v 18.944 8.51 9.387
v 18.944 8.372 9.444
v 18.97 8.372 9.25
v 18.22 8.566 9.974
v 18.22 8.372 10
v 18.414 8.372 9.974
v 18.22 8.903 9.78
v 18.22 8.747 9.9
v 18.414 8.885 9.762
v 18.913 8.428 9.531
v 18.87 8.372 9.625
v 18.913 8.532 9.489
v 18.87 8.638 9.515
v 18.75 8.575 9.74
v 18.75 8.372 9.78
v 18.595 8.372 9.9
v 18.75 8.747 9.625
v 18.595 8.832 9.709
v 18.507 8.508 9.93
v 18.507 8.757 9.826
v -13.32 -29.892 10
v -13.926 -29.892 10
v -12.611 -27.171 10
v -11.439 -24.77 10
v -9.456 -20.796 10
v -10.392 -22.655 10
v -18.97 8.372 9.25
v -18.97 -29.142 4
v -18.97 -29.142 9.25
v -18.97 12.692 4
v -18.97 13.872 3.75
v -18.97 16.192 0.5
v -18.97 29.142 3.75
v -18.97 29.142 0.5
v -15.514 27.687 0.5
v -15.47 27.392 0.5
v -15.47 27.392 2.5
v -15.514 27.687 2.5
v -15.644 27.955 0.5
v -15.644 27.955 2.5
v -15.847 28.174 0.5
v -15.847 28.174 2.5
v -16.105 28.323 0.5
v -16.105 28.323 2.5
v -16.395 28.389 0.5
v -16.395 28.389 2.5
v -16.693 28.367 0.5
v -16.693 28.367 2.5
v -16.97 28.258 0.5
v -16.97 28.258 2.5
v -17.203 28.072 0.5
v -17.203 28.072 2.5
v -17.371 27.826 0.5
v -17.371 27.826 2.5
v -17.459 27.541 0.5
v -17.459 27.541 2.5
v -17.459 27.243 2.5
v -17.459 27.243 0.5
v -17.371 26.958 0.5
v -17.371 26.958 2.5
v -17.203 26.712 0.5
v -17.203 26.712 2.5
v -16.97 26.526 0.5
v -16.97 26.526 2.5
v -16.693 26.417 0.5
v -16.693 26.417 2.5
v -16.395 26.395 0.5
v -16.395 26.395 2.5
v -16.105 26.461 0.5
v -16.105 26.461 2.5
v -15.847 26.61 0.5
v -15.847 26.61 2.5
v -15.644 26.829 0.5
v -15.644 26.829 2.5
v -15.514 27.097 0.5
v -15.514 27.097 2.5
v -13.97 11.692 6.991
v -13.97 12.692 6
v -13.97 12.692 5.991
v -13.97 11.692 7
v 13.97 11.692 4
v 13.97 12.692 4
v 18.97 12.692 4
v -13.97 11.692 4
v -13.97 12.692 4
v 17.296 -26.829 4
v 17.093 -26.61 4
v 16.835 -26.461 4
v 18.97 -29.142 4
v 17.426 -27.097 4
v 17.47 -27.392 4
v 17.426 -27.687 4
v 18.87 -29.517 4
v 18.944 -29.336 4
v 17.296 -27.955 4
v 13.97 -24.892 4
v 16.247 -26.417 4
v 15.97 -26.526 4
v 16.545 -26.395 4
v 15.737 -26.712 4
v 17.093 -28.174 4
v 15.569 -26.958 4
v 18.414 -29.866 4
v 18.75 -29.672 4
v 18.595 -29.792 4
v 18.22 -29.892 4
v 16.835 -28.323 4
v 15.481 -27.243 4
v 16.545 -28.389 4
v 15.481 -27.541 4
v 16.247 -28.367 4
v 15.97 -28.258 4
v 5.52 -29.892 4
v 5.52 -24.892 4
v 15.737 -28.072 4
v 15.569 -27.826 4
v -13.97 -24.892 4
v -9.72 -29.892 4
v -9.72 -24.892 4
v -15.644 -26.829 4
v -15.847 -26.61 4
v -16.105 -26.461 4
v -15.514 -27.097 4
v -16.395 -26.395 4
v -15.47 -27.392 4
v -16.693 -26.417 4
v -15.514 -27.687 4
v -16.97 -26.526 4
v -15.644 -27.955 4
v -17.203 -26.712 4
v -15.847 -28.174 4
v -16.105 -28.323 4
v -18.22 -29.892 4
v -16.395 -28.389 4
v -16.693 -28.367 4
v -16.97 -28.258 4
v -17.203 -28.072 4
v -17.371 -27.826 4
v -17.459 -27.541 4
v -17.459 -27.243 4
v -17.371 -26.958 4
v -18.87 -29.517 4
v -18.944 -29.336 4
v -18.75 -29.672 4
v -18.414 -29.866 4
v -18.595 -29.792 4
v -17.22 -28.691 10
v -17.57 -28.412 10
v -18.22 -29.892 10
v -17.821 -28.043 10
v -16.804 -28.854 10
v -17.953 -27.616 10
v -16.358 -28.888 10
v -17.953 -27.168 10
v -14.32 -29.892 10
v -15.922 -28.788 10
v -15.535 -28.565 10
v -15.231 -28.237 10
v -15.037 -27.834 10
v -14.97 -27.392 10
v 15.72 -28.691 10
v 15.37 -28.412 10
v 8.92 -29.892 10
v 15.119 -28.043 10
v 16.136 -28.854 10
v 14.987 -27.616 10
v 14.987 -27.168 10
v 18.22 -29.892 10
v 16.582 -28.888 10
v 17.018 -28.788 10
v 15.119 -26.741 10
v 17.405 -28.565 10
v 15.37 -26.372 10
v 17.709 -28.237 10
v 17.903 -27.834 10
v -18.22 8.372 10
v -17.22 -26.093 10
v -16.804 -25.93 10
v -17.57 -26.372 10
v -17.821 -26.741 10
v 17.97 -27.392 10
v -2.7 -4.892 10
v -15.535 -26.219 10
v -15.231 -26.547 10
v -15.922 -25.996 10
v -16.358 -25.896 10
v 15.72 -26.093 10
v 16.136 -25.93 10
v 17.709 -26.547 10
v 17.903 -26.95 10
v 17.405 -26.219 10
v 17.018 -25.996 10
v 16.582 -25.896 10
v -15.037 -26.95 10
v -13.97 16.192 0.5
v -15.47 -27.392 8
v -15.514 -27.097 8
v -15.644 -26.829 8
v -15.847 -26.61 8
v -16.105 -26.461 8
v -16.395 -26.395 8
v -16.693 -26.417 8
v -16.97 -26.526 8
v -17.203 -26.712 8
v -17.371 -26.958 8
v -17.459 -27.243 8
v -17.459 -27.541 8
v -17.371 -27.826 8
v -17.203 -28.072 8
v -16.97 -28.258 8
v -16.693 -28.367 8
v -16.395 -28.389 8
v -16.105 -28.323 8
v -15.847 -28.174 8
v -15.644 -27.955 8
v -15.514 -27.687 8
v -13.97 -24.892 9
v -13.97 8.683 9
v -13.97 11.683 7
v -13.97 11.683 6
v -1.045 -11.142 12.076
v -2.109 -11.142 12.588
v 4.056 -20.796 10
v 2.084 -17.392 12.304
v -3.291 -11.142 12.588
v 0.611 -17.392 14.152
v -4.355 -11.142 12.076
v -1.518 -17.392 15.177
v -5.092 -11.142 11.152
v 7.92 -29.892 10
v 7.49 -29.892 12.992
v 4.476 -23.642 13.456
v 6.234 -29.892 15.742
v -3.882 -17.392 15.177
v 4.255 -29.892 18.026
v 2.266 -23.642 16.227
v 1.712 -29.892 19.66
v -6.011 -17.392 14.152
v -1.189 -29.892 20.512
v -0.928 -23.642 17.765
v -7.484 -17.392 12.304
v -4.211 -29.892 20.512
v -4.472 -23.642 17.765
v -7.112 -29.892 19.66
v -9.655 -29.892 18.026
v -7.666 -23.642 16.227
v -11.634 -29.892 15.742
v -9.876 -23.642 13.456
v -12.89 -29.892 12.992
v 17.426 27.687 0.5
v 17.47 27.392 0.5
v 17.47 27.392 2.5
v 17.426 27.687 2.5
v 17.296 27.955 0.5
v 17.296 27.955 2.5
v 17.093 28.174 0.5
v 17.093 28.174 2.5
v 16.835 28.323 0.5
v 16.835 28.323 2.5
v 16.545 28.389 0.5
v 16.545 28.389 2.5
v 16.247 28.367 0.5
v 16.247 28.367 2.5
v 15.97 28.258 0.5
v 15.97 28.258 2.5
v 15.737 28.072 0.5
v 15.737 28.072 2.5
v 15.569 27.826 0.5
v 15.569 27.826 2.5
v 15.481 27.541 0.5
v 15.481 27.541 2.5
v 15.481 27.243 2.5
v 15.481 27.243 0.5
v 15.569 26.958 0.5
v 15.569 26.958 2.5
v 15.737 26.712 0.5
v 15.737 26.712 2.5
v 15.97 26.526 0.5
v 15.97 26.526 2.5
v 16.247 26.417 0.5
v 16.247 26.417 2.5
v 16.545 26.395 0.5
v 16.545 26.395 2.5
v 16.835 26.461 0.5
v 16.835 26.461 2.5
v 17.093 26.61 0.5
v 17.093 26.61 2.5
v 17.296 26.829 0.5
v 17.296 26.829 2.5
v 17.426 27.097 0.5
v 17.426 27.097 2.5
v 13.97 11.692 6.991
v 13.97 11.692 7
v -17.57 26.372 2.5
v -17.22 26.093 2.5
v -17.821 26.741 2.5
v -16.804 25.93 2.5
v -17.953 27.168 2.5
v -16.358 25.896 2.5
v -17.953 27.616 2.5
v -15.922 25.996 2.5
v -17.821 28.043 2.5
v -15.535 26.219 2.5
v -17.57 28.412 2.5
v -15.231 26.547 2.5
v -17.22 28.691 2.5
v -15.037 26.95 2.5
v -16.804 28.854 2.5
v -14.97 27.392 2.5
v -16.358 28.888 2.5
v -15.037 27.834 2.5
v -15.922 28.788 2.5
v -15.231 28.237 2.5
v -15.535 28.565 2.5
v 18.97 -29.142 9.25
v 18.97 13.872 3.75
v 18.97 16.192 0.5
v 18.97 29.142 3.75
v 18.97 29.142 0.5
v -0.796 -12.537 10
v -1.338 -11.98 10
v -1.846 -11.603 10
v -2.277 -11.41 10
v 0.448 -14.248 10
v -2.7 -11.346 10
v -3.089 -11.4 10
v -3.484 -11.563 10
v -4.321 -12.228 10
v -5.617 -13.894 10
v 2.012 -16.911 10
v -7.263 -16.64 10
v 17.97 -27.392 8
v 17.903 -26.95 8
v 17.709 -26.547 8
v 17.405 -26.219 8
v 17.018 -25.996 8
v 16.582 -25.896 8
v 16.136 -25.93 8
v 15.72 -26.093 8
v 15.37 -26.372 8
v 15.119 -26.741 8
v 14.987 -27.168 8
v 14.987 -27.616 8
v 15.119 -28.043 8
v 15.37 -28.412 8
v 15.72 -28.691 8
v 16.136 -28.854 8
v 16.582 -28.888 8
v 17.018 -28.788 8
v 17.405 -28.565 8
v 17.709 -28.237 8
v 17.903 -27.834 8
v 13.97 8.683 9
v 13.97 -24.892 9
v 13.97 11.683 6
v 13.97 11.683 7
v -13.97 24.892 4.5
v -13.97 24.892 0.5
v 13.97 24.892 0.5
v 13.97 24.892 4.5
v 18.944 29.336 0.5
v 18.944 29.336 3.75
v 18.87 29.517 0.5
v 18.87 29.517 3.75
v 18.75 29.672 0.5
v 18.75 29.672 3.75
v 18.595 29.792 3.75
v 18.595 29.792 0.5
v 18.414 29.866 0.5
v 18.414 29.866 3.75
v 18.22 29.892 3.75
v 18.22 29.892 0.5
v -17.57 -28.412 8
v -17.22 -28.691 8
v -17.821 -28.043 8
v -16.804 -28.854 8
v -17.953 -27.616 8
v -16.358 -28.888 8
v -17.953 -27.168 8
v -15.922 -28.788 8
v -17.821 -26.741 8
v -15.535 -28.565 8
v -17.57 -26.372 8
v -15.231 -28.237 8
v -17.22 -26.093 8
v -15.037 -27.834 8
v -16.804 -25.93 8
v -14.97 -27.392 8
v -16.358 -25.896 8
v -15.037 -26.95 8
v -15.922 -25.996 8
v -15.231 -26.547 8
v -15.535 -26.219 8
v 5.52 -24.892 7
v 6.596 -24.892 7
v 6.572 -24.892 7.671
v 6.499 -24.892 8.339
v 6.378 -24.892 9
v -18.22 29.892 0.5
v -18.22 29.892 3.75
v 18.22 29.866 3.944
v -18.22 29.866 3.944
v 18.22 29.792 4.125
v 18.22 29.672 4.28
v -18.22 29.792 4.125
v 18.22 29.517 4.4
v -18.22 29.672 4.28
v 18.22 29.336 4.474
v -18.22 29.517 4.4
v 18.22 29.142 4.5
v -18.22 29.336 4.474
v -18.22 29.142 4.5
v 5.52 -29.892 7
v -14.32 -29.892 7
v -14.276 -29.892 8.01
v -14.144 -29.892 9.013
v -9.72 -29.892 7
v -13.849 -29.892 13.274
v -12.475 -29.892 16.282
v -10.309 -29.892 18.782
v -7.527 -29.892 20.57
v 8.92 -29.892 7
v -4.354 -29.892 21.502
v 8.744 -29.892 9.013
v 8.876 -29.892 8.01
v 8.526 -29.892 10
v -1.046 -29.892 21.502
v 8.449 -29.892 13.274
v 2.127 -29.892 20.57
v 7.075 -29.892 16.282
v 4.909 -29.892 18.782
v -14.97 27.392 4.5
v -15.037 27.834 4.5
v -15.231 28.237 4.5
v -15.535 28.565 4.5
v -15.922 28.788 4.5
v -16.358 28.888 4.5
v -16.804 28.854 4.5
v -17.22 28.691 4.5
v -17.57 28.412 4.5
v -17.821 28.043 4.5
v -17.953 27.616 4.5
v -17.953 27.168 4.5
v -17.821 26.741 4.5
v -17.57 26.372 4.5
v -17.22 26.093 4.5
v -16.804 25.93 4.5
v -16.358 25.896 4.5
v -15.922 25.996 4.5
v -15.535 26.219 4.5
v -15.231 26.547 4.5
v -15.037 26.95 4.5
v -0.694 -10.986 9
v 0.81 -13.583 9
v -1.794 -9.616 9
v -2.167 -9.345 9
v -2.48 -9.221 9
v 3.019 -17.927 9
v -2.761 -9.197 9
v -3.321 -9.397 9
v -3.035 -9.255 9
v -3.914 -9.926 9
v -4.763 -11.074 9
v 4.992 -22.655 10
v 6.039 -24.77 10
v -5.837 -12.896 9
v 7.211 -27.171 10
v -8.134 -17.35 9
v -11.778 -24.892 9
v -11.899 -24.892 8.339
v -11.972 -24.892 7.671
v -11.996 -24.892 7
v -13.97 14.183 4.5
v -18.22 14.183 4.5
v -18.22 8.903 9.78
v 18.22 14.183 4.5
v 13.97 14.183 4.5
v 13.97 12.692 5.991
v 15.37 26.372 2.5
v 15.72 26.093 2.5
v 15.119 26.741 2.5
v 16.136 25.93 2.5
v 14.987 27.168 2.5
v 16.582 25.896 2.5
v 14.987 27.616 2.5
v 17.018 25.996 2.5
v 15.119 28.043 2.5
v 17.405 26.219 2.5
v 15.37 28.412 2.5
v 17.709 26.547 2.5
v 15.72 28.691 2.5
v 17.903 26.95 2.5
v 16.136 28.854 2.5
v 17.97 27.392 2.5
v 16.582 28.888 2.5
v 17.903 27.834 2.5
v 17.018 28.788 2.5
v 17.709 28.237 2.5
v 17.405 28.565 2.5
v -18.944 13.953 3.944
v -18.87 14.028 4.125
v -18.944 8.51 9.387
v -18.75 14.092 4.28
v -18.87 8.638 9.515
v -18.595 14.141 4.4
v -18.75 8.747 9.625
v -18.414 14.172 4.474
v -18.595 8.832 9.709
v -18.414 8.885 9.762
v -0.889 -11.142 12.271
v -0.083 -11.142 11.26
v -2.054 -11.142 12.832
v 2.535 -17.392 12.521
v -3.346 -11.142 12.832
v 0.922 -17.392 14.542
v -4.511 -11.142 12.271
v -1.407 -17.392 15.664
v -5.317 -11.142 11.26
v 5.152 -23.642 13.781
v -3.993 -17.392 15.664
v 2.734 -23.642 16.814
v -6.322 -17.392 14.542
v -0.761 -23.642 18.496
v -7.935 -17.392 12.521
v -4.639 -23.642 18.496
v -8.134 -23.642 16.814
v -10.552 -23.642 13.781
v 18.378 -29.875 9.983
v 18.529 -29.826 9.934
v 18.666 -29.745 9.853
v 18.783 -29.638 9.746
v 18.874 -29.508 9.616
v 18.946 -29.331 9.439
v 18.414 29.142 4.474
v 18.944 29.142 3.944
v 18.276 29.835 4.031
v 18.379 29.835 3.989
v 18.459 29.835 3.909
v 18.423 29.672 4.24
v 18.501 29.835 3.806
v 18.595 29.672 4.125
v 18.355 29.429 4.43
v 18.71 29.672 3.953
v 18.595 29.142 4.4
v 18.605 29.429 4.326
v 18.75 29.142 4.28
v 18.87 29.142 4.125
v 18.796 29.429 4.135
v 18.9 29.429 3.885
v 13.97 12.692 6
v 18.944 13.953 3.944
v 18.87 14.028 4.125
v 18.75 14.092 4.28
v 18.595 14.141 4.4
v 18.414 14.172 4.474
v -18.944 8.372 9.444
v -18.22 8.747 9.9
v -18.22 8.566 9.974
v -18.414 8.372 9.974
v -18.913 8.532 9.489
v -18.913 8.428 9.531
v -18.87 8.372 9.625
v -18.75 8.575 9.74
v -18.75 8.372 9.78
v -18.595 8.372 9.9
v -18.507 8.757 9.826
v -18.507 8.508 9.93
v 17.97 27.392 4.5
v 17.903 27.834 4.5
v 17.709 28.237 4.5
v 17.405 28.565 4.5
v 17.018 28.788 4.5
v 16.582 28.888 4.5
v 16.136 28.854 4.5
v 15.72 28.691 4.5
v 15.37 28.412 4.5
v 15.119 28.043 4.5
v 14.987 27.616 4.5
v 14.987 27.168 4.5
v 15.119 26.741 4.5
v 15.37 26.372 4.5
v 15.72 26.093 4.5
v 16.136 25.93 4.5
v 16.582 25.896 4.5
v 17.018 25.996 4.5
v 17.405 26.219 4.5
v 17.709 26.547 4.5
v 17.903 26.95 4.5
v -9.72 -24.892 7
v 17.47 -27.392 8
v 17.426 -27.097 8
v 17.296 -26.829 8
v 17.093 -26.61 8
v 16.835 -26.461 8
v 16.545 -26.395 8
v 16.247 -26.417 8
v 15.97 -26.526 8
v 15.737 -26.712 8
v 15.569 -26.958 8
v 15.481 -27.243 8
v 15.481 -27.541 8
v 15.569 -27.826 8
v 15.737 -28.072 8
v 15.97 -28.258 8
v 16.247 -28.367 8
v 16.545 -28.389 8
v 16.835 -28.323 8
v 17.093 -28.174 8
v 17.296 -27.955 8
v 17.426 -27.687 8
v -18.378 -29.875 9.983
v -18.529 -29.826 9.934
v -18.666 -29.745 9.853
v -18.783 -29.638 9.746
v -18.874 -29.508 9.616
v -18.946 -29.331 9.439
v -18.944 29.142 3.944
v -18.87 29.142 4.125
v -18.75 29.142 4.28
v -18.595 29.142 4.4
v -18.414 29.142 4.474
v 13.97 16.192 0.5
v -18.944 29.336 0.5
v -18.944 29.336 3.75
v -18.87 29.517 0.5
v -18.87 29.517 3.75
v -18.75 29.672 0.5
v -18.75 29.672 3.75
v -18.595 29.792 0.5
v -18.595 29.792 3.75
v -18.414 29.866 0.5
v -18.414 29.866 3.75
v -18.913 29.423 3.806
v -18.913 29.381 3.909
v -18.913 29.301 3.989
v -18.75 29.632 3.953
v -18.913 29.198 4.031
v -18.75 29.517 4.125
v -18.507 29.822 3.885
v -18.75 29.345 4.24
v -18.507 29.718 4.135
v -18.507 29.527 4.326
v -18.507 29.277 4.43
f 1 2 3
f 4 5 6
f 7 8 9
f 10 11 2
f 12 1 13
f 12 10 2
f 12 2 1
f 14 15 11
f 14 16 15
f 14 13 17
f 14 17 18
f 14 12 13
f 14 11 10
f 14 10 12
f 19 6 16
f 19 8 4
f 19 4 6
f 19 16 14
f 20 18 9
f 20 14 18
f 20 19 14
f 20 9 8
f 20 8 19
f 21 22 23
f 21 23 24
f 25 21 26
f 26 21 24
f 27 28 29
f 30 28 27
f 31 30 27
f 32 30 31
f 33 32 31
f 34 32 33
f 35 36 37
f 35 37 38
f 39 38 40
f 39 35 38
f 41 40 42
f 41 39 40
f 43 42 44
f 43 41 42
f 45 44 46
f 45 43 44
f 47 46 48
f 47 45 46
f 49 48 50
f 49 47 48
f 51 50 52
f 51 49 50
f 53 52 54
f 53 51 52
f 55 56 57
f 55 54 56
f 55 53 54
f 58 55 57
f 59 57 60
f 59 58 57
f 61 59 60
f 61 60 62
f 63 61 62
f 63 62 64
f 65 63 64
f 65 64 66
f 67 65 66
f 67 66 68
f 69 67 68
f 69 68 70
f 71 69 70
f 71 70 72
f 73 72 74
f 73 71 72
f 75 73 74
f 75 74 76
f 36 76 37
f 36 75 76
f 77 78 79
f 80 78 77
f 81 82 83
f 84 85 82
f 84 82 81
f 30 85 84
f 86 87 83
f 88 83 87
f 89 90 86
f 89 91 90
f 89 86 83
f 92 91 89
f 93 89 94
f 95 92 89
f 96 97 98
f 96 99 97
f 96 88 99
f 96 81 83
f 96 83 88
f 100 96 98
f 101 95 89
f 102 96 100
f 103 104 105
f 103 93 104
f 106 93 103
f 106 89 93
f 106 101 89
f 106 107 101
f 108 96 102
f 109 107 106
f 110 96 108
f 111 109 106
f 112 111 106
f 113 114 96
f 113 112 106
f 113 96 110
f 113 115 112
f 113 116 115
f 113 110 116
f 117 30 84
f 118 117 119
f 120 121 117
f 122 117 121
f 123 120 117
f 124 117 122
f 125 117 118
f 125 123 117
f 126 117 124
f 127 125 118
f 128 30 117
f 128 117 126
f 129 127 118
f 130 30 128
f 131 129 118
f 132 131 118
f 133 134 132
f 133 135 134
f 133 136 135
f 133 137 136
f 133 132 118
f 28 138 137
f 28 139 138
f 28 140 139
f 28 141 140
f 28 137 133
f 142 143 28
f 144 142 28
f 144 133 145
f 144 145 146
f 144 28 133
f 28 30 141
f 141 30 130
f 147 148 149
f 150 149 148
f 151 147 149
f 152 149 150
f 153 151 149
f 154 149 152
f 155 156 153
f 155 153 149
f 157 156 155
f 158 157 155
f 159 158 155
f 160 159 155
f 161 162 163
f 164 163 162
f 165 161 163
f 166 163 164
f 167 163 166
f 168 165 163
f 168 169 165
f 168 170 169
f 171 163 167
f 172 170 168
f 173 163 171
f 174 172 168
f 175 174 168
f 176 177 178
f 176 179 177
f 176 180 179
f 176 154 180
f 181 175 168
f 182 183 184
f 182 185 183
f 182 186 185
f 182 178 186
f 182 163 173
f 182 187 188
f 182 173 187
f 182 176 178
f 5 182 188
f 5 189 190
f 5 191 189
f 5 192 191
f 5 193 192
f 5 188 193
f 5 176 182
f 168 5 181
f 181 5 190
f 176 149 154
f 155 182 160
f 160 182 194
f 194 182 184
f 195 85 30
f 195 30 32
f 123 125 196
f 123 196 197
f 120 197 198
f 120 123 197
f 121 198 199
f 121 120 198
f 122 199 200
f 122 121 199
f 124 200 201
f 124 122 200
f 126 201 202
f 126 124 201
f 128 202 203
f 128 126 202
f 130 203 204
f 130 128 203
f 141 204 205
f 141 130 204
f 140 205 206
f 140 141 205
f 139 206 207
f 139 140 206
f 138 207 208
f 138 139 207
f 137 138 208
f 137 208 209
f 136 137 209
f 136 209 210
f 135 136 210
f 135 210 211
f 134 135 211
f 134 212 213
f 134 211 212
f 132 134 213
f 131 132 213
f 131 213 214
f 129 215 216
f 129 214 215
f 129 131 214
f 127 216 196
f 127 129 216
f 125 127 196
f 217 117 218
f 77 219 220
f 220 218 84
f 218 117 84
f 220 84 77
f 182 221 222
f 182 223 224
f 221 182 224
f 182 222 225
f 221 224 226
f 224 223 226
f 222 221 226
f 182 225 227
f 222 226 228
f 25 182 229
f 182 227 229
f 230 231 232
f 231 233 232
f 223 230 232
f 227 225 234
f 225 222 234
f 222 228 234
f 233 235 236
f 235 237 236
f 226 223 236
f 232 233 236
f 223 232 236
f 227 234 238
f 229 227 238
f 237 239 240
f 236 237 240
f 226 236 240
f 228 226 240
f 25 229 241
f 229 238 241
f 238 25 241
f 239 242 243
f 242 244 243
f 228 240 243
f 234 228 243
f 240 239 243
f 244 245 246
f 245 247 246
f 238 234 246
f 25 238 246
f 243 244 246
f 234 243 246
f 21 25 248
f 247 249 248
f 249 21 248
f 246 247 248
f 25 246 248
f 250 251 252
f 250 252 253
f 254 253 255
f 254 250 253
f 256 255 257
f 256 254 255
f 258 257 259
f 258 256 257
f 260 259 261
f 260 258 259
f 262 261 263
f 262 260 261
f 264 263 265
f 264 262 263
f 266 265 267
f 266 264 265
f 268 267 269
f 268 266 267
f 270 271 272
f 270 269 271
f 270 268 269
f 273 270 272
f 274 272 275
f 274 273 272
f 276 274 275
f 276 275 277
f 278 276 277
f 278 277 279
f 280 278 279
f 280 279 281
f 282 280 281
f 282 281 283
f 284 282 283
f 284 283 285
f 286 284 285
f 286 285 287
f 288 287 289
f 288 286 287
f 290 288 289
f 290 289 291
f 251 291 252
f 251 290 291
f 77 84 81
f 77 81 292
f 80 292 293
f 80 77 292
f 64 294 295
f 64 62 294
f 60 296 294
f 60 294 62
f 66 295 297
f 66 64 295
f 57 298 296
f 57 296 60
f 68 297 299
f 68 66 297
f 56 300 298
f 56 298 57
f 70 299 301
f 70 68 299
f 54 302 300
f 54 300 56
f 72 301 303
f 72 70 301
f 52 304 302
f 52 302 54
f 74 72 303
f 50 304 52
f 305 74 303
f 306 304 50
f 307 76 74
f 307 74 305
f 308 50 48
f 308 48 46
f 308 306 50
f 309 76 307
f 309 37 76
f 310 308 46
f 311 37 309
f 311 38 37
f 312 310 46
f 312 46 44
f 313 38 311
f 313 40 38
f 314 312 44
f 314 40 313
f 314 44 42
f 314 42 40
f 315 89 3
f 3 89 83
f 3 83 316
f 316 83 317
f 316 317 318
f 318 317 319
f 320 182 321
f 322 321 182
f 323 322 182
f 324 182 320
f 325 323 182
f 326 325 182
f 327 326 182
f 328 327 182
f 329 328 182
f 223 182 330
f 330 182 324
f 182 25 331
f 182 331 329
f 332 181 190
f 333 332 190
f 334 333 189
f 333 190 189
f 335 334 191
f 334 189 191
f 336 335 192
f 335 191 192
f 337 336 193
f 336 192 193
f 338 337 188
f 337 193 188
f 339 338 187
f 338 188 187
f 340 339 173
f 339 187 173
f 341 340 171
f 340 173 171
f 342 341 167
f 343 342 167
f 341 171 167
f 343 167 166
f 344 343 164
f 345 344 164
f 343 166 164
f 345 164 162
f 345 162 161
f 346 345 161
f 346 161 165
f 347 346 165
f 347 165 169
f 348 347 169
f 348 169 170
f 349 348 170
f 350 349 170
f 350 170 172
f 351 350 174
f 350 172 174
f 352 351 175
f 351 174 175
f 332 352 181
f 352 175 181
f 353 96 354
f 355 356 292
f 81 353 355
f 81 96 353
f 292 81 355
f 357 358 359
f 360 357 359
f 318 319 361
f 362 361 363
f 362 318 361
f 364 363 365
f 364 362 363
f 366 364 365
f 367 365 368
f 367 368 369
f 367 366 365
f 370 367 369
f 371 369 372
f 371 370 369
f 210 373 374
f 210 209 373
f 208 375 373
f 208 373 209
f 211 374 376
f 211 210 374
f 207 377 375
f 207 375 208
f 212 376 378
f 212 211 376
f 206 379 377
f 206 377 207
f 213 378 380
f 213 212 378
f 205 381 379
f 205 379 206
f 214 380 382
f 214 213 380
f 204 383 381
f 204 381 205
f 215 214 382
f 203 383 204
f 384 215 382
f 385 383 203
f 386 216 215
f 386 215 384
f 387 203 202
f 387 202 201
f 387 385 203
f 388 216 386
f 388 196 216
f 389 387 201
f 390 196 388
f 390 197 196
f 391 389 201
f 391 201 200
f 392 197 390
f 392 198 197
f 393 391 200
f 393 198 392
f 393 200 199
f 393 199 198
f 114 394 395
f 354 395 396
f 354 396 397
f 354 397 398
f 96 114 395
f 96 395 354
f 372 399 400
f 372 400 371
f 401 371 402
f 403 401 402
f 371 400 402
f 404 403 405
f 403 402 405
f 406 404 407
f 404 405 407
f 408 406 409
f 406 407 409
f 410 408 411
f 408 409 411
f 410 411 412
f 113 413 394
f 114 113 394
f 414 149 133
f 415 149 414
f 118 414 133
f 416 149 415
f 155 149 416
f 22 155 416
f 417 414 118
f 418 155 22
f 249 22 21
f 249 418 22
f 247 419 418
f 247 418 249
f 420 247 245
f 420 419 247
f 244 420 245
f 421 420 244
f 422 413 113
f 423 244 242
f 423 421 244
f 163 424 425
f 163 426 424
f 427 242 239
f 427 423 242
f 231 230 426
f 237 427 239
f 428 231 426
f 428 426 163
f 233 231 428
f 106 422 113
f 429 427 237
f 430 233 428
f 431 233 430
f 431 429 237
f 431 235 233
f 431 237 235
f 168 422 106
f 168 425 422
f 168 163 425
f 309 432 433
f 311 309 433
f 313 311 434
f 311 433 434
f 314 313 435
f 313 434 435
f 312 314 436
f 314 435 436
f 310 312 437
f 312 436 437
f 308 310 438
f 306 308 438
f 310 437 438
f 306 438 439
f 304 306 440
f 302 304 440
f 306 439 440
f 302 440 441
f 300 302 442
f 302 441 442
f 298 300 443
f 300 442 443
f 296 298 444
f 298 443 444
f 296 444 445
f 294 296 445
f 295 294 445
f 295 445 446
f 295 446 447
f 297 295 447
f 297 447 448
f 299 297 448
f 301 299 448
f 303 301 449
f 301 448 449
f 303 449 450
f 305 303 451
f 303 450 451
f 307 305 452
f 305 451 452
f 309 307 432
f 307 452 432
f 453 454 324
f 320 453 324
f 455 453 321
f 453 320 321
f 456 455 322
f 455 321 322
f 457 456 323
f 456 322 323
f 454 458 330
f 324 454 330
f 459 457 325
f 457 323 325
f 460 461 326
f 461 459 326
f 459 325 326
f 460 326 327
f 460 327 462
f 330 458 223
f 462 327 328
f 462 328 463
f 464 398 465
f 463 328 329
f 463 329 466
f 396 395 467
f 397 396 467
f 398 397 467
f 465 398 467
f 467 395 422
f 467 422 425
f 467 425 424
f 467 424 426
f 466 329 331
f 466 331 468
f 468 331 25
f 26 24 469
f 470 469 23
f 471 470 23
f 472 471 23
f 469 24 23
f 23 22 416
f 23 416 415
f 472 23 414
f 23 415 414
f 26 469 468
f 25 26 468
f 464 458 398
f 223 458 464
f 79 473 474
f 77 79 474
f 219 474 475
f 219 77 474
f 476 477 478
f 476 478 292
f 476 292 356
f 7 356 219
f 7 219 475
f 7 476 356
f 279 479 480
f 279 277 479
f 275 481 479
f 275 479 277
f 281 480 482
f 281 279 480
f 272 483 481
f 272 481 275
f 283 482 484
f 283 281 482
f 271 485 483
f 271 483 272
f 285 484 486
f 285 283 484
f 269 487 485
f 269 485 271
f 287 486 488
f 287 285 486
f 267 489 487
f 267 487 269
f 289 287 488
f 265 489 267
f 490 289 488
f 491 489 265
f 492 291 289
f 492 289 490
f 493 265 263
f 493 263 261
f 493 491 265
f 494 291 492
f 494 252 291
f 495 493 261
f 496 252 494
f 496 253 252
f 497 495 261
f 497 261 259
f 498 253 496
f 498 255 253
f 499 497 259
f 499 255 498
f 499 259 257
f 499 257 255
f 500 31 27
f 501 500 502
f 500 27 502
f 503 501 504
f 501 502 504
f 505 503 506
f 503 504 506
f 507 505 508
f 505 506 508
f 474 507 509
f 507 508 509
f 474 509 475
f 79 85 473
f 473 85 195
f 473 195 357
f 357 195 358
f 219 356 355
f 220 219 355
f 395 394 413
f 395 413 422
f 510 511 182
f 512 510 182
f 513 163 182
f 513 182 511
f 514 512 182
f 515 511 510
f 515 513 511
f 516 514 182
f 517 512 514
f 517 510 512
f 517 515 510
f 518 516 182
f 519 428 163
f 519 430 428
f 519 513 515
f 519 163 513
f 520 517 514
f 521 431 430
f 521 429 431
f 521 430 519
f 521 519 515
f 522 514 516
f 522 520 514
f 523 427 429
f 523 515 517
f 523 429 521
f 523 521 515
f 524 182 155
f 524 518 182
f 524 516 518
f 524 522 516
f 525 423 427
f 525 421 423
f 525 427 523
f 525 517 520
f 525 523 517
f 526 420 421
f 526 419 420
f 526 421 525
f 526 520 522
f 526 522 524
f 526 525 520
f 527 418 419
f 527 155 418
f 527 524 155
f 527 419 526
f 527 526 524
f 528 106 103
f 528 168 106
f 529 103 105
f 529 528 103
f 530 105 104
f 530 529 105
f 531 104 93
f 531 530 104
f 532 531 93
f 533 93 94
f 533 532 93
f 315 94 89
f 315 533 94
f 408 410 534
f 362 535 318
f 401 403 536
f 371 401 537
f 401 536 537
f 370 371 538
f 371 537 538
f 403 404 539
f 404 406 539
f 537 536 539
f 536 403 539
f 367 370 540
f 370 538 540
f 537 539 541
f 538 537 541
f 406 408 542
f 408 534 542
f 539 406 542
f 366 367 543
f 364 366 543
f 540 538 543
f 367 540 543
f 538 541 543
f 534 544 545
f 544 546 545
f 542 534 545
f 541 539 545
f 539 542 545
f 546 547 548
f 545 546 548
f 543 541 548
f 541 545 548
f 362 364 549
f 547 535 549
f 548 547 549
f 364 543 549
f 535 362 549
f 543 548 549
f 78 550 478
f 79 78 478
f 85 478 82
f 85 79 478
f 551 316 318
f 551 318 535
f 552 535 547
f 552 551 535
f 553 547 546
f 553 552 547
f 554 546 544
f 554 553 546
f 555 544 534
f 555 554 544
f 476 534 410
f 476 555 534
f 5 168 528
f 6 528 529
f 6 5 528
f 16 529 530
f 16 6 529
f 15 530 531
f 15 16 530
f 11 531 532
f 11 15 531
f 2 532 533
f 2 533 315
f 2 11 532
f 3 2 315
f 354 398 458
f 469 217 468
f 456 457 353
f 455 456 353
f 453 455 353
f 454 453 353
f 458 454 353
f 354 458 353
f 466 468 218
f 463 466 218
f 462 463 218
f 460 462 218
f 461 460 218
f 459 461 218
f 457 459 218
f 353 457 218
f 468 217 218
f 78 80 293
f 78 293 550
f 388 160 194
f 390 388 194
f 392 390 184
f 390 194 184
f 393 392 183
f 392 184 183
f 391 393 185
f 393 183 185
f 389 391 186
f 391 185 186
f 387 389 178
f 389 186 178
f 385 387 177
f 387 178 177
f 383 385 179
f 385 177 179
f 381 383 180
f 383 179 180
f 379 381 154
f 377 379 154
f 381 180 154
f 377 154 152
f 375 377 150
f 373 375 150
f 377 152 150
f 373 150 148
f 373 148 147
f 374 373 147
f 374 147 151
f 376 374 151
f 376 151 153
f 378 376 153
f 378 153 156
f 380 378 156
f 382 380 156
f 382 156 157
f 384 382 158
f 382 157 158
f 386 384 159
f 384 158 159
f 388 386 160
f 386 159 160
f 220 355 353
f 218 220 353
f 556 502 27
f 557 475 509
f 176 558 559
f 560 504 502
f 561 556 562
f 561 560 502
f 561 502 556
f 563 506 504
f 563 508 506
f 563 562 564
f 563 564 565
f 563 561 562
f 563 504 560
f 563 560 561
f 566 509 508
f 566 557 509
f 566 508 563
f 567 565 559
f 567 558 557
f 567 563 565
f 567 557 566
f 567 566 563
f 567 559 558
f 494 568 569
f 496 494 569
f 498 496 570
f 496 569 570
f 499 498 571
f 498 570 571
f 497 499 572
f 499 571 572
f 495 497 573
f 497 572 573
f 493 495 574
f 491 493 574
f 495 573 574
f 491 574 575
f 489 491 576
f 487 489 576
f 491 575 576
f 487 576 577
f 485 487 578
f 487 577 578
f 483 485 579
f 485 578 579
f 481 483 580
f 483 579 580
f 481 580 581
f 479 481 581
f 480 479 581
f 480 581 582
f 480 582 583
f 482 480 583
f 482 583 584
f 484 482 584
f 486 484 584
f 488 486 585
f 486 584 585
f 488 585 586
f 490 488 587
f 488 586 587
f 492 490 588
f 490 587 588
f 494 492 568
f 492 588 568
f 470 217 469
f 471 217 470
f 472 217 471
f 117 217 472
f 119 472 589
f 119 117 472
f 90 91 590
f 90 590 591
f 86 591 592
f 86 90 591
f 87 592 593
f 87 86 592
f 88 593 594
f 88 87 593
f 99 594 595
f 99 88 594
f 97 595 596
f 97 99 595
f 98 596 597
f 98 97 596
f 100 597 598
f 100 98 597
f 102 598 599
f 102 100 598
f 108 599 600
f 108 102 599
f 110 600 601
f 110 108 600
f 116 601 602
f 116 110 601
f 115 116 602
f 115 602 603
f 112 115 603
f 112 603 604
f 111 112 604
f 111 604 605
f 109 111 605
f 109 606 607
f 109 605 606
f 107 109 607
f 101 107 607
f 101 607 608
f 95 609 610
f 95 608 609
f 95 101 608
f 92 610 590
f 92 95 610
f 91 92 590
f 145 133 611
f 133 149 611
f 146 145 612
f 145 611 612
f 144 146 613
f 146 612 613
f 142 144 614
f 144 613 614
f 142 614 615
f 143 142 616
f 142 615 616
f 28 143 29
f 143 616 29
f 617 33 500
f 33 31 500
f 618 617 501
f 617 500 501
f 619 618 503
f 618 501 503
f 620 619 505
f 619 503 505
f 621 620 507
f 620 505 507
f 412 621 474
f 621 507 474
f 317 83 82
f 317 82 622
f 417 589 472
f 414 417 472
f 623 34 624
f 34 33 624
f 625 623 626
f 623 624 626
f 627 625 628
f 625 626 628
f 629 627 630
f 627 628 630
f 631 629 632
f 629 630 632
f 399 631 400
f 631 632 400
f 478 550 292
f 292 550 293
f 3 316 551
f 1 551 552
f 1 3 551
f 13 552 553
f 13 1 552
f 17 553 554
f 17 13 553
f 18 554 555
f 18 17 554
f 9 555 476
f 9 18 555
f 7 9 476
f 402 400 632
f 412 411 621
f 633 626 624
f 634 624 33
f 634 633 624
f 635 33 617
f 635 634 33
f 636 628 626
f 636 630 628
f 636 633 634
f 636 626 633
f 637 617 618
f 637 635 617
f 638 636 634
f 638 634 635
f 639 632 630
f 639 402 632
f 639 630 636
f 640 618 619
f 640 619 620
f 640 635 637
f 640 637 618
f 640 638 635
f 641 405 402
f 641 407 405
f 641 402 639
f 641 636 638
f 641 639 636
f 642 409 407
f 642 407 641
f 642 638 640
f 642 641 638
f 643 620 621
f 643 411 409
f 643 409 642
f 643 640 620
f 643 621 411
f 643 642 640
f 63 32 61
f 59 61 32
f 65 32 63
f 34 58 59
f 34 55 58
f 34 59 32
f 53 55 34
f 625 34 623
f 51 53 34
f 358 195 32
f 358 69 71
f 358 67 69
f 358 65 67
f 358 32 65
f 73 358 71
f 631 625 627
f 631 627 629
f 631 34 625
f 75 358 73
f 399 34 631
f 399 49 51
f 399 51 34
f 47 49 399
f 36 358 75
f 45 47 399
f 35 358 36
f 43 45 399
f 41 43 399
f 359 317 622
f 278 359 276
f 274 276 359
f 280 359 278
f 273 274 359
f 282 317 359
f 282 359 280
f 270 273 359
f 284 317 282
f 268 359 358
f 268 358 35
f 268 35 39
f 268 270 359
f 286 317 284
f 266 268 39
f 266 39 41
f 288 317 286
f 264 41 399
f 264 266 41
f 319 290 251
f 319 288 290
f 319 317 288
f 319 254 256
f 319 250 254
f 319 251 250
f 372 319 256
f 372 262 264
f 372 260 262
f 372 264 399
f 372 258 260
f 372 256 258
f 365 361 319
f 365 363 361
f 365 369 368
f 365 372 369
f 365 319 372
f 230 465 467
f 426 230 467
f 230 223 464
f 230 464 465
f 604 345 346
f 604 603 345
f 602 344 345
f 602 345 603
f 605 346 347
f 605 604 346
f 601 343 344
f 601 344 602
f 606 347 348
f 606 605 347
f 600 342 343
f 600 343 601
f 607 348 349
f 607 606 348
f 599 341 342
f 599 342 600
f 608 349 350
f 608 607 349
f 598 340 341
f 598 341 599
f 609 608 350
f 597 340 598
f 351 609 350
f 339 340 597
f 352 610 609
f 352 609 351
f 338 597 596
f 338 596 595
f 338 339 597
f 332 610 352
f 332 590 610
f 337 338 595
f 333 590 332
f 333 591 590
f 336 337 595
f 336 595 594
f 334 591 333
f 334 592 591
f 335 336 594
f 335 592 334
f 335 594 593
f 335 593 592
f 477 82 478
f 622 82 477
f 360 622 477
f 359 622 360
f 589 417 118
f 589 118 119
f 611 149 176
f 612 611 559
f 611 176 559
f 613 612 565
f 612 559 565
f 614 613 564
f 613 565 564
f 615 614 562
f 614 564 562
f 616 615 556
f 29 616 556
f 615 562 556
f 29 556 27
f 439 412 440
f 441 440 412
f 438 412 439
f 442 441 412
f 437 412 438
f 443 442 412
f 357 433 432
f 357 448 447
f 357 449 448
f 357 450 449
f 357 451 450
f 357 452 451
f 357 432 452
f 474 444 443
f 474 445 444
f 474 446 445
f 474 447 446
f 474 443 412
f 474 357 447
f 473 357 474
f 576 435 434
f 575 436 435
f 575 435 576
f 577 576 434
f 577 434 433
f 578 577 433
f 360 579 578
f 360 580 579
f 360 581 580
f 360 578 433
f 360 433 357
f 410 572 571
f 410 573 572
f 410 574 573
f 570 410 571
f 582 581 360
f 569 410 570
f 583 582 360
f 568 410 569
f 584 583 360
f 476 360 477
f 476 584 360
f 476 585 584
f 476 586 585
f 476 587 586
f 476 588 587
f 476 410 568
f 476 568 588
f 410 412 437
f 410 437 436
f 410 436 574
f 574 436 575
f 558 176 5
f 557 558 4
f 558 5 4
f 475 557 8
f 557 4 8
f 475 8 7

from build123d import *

# Parameters (mm, degrees)
SKETCH002_W     = 37.94
SKETCH002_H     = 59.784
SKETCH002_R     = 1
SKETCH002_W_2   = 27.94
SKETCH002_H_2   = 49.784
PAD_DEPTH       = 10
POCKET_DEPTH    = 37.94
POCKET001_DEPTH = 37.94
PAD001_DEPTH    = 27.94
SKETCH005_W     = 33.575
SKETCH005_H     = 1
PAD002_DEPTH    = 27.94
SKETCH006_R     = 1.5
POCKET002_DEPTH = 2
SKETCH007_R     = 1.5
POCKET003_DEPTH = 2
SKETCH008_W     = 15.24
SKETCH008_H     = 5
POCKET004_DEPTH = 6
CONE_ANGLE      = 180
CONE001_ANGLE   = 180
CONE002_ANGLE   = 180
FILLET_R        = 0.75


with BuildPart() as part:
    # Sketch002 → Pad (new body)
    with BuildSketch(Plane.XY):
        Rectangle(SKETCH002_W, SKETCH002_H)
        with Locations((-16.47, 27.392)):
            Circle(SKETCH002_R, mode=Mode.SUBTRACT)
        with Locations((16.47, 27.392)):
            Circle(SKETCH002_R, mode=Mode.SUBTRACT)
        with Locations((-16.47, -27.392)):
            Circle(SKETCH002_R, mode=Mode.SUBTRACT)
        with Locations((16.47, -27.392)):
            Circle(SKETCH002_R, mode=Mode.SUBTRACT)
        Rectangle(SKETCH002_W_2, SKETCH002_H_2, mode=Mode.SUBTRACT)
    extrude(amount=PAD_DEPTH)

    # Sketch (on Face2 of Pad) → Pocket (cut)
    with BuildSketch(Plane.YZ.offset(18.97)):
        Polygon((8.683, 10), (29.892, 10), (29.892, 4.5), (14.183, 4.5), align=None)
        Polygon((-29.892, 4), (12.692, 4), (16.692, 0), (-29.892, 0), align=None)
    extrude(amount=-POCKET_DEPTH, mode=Mode.SUBTRACT)

    # Sketch003 (on Face3 of Pocket) → Pocket001 (cut)
    with BuildSketch(Plane.YZ.offset(18.97)):
        Polygon((16.192, 0.5), (29.892, 0.5), (29.892, 0), (16.692, 0), align=None)
    extrude(amount=-POCKET001_DEPTH, mode=Mode.SUBTRACT)

    # Sketch004 (on Face7 of Pocket001) → Pad001 (join)
    with BuildSketch(Plane.YZ.offset(-13.97)):
        Polygon((11.692, 7), (12.692, 6), (12.692, 4), (11.692, 4), align=None)
        Polygon((8.683, 10), (11.683, 7), (11.683, 6), (8.683, 9), align=None)
    extrude(amount=PAD001_DEPTH)

    # Sketch005 (on Face22 of Pad001) → Pad002 (join)
    with BuildSketch(Plane.YZ.offset(-13.97)):
        with Locations((-8.1045, 9.5)):
            Rectangle(SKETCH005_W, SKETCH005_H)
    extrude(amount=PAD002_DEPTH)

    # Sketch006 (on Face15 of Pad002) → Pocket002 (cut)
    with BuildSketch(Plane.XY.offset(10)):
        with Locations((-16.47, -27.392)):
            Circle(SKETCH006_R)
        with Locations((16.47, -27.392)):
            Circle(SKETCH006_R)
    extrude(amount=-POCKET002_DEPTH, mode=Mode.SUBTRACT)

    # Sketch007 (on Face4 of Pocket002) → Pocket003 (cut)
    with BuildSketch(Plane.XY.offset(4.5)):
        with Locations((-16.47, 27.392)):
            Circle(SKETCH007_R)
        with Locations((16.47, 27.392)):
            Circle(SKETCH007_R)
    extrude(amount=-POCKET003_DEPTH, mode=Mode.SUBTRACT)

    # Sketch008 (on Face15 of Pocket003) → Pocket004 (cut)
    with BuildSketch(Plane.XY.offset(10)):
        with Locations((-2.1, -27.392)):
            Rectangle(SKETCH008_W, SKETCH008_H)
    extrude(amount=-POCKET004_DEPTH, mode=Mode.SUBTRACT)

    # Cone → Cone (revolve, cut)
    with BuildSketch(Plane(origin=(-2.7, -4.892, 7), x_dir=(1, 0, 0), z_dir=(0, 0, -1))):
        Polygon((0, 0), (11.62, 25), (0, 25), align=None)
    revolve(axis=Axis((-2.7, -4.892, 7), (0, -1, 0)), revolution_arc=CONE_ANGLE, mode=Mode.SUBTRACT)

    # Cone001 → Cone001 (revolve)
    with BuildSketch(Plane(origin=(-2.7, -4.892, 10), x_dir=(1, 0, 0), z_dir=(0, 0, -1))):
        Polygon((0, 0), (11.62, 25), (0, 25), align=None)
    revolve(axis=Axis((-2.7, -4.892, 10), (0, -1, 0)), revolution_arc=CONE001_ANGLE)

    # Cone002 → Cone002 (revolve, cut)
    with BuildSketch(Plane(origin=(-2.7, -4.892, 10), x_dir=(1, 0, 0), z_dir=(0, 0, -1))):
        Polygon((0, 0), (10.62, 25), (0, 25), align=None)
    revolve(axis=Axis((-2.7, -4.892, 10), (0, -1, 0)), revolution_arc=CONE002_ANGLE, mode=Mode.SUBTRACT)

    # Fillet
    fillet_edges = [part.edges().sort_by_distance(p)[0] for p in [
        (-18.97, -29.892, 7),
        (18.97, -29.892, 7),
        (18.97, -10.6045, 10),
        (18.97, 11.433, 7.25),
        (18.97, 22.0375, 4.5),
        (0, 29.892, 4.5),
        (-18.97, 29.892, 2.5),
        (-18.97, 22.0375, 4.5),
        (18.97, 29.892, 2.5),
        (-18.97, 11.433, 7.25),
        (-18.97, -10.6045, 10),
        (-16.47, 8.683, 10),
        (0, 8.683, 10),
        (16.47, 8.683, 10),
    ]]
    fillet(fillet_edges, radius=FILLET_R)


solid = part.part
